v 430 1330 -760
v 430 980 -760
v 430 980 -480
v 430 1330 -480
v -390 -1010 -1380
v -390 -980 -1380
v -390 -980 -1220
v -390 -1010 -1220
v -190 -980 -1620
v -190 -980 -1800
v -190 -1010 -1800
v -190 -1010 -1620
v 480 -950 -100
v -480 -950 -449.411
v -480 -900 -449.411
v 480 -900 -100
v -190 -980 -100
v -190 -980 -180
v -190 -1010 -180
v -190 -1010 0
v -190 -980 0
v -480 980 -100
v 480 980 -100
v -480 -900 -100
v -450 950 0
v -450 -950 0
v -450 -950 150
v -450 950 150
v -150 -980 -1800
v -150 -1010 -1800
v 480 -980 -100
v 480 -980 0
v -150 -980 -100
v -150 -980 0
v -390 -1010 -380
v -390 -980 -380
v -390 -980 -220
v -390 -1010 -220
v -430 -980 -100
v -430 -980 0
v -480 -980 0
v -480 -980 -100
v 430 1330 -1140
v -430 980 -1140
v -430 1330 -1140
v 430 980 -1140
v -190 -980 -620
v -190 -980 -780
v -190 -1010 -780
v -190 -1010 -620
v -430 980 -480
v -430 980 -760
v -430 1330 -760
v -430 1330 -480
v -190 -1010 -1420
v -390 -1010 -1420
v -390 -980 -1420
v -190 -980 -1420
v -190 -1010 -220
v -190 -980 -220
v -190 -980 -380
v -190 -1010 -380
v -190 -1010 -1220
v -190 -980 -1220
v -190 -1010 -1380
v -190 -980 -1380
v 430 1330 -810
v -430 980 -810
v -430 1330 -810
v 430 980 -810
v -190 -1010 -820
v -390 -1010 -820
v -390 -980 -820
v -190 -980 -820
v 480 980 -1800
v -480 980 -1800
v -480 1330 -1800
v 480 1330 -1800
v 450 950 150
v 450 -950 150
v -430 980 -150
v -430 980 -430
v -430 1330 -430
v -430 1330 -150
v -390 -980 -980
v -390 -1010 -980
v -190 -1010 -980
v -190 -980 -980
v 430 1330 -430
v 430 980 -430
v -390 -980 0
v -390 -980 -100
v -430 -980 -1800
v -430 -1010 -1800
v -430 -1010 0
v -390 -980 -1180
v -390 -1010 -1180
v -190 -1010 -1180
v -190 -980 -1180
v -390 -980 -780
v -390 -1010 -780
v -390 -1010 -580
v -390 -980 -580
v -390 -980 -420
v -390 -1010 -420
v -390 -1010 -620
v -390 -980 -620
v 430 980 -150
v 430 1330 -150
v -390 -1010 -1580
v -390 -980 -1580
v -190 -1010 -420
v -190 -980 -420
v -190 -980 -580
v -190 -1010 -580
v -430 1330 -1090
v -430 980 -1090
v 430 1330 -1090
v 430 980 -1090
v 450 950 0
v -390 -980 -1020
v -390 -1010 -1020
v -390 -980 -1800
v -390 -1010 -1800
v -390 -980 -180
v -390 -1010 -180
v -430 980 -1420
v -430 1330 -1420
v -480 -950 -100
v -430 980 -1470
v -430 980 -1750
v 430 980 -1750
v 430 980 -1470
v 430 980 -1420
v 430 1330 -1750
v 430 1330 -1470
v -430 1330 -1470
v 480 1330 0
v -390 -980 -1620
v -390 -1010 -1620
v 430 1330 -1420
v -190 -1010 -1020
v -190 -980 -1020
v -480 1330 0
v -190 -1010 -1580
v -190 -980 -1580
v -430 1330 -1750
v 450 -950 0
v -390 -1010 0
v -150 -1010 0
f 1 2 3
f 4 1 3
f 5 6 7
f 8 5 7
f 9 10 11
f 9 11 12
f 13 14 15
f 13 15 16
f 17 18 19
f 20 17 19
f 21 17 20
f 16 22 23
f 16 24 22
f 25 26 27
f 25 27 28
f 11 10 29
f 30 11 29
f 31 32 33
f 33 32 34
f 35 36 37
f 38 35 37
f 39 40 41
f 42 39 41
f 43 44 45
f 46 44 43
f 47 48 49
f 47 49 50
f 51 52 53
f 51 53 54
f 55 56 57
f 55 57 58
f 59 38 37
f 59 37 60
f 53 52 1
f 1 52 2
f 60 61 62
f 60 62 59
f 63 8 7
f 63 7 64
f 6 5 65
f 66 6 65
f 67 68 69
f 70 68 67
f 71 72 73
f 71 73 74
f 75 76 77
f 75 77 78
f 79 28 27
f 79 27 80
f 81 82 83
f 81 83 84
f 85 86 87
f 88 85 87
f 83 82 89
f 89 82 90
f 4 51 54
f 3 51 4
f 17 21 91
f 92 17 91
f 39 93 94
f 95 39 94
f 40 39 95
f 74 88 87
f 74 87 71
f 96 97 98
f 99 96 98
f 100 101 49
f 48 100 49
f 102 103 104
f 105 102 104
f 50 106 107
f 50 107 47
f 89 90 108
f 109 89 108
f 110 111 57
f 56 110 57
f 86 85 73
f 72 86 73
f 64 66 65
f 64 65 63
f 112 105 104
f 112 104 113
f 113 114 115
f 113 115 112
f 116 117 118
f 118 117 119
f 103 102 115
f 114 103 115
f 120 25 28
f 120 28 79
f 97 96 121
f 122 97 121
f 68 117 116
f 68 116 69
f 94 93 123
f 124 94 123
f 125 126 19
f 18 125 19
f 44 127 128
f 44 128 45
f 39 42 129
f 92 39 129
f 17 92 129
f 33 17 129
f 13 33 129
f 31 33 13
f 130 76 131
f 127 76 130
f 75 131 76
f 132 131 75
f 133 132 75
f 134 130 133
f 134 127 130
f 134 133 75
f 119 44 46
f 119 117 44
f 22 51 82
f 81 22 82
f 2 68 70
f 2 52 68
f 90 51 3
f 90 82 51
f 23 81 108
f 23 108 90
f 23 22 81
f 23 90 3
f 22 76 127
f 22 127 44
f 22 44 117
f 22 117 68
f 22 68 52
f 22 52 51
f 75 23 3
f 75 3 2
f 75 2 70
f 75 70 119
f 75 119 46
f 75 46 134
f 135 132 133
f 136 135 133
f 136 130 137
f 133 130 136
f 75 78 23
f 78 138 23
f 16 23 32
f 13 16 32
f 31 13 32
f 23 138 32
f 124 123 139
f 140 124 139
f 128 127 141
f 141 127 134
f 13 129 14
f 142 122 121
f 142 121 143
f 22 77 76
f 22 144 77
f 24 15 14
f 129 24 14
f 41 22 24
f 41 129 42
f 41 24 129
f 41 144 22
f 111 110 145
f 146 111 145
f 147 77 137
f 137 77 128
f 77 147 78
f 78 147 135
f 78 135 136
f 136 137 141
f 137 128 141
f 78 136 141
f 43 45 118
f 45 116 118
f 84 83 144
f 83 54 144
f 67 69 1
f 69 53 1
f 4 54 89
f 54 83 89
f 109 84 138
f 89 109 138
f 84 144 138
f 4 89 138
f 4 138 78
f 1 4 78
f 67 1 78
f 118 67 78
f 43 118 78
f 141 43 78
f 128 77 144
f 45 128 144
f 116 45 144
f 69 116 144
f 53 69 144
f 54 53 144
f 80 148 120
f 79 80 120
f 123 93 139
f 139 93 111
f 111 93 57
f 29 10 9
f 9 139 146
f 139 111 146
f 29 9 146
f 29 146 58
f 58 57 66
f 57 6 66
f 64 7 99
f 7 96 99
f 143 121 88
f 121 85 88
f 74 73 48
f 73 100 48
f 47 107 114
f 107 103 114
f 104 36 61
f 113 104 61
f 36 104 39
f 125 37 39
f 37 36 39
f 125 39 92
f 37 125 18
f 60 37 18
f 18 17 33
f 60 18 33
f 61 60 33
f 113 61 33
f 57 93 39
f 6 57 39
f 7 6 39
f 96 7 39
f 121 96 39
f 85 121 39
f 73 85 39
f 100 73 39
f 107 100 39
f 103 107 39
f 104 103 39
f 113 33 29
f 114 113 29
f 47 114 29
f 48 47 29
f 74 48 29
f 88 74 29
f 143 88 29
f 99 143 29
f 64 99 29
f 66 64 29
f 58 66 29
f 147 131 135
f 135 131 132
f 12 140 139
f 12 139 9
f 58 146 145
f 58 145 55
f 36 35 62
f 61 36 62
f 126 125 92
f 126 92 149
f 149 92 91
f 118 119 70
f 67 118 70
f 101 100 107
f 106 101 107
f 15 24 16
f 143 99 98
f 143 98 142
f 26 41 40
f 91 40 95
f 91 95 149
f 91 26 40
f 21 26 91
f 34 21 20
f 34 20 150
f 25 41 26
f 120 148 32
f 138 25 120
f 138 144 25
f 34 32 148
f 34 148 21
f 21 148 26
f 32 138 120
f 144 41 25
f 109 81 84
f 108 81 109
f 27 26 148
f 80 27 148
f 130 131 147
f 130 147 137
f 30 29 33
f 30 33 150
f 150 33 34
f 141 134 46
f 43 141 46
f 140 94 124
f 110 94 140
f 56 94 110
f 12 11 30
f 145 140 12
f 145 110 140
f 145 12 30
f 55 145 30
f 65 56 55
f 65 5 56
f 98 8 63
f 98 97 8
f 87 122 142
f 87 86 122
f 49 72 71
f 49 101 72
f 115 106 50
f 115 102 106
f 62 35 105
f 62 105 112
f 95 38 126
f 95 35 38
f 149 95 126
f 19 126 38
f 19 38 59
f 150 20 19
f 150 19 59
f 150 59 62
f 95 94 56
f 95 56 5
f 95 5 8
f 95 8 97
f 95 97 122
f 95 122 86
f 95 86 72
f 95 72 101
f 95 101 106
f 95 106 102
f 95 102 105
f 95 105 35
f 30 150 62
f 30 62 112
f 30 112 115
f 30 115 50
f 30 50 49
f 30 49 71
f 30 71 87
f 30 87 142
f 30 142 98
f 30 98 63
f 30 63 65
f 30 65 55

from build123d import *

# Parameters (mm, degrees)
F0_W      = 900
F0_H      = 1900
F1_DEPTH  = 150
F3_DEPTH  = 100
F4_W      = 960
F4_H      = 350
F5_DEPTH  = 1700
F6_W      = 860
F6_H      = 280
F7_DEPTH  = 350
F9_DEPTH  = 50
F10_W     = 40
F10_H     = 1800
F11_DEPTH = 30
F12_W     = 200
F12_H     = 40
F13_DEPTH = 30


with BuildPart() as f1:
    # F0 (on Top) → F1 (new body)
    with BuildSketch(Plane.XY):
        Rectangle(F0_W, F0_H)
    extrude(amount=F1_DEPTH)

    # F2 (on face) → F3 (join)
    with BuildSketch(Plane(origin=(0, 0, 0), x_dir=(1, 0, 0), z_dir=(0, 0, -1))):
        Polygon((480, 980), (-480, 980), (-480, -980), (-480, -1330), (480, -1330), (480, -980), align=None)
    extrude(amount=F3_DEPTH)

    # F4 (on face) → F5 (join)
    with BuildSketch(Plane(origin=(0, 0, -100), x_dir=(1, 0, 0), z_dir=(0, 0, -1))):
        with Locations((0, -1155)):
            Rectangle(F4_W, F4_H)
    extrude(amount=F5_DEPTH)

    # F6 (on face) → F7 (cut, through all)
    with BuildSketch(Plane.XZ.offset(-980)):
        with Locations((0, -290)):
            Rectangle(F6_W, F6_H)
        with Locations((0, -620)):
            Rectangle(F6_W, F6_H)
        with Locations((0, -950)):
            Rectangle(F6_W, F6_H)
        with Locations((0, -1280)):
            Rectangle(F6_W, F6_H)
        with Locations((0, -1610)):
            Rectangle(F6_W, F6_H)
    extrude(amount=-F7_DEPTH, mode=Mode.SUBTRACT)

    # F8 (on face) → F9 (join)
    with BuildSketch(Plane.XZ.offset(950)):
        Polygon((480, -100), (-480, -100), (-480, -449.411425), align=None)
    extrude(amount=-F9_DEPTH)

    # F10 (on face) → F11 (join)
    with BuildSketch(Plane.XZ.offset(980)):
        with Locations((-410, -900)):
            Rectangle(F10_W, F10_H)
        with Locations((-170, -900)):
            Rectangle(F10_W, F10_H)
    extrude(amount=F11_DEPTH)

    # F12 (on face) → F13 (join, through all)
    with BuildSketch(Plane.XZ.offset(1010)):
        with Locations((-290, -200)):
            Rectangle(F12_W, F12_H)
        with Locations((-290, -400)):
            Rectangle(F12_W, F12_H)
        with Locations((-290, -600)):
            Rectangle(F12_W, F12_H)
        with Locations((-290, -800)):
            Rectangle(F12_W, F12_H)
        with Locations((-290, -1000)):
            Rectangle(F12_W, F12_H)
        with Locations((-290, -1200)):
            Rectangle(F12_W, F12_H)
        with Locations((-290, -1400)):
            Rectangle(F12_W, F12_H)
        with Locations((-290, -1600)):
            Rectangle(F12_W, F12_H)
    extrude(amount=-F13_DEPTH)


solid = f1.part
